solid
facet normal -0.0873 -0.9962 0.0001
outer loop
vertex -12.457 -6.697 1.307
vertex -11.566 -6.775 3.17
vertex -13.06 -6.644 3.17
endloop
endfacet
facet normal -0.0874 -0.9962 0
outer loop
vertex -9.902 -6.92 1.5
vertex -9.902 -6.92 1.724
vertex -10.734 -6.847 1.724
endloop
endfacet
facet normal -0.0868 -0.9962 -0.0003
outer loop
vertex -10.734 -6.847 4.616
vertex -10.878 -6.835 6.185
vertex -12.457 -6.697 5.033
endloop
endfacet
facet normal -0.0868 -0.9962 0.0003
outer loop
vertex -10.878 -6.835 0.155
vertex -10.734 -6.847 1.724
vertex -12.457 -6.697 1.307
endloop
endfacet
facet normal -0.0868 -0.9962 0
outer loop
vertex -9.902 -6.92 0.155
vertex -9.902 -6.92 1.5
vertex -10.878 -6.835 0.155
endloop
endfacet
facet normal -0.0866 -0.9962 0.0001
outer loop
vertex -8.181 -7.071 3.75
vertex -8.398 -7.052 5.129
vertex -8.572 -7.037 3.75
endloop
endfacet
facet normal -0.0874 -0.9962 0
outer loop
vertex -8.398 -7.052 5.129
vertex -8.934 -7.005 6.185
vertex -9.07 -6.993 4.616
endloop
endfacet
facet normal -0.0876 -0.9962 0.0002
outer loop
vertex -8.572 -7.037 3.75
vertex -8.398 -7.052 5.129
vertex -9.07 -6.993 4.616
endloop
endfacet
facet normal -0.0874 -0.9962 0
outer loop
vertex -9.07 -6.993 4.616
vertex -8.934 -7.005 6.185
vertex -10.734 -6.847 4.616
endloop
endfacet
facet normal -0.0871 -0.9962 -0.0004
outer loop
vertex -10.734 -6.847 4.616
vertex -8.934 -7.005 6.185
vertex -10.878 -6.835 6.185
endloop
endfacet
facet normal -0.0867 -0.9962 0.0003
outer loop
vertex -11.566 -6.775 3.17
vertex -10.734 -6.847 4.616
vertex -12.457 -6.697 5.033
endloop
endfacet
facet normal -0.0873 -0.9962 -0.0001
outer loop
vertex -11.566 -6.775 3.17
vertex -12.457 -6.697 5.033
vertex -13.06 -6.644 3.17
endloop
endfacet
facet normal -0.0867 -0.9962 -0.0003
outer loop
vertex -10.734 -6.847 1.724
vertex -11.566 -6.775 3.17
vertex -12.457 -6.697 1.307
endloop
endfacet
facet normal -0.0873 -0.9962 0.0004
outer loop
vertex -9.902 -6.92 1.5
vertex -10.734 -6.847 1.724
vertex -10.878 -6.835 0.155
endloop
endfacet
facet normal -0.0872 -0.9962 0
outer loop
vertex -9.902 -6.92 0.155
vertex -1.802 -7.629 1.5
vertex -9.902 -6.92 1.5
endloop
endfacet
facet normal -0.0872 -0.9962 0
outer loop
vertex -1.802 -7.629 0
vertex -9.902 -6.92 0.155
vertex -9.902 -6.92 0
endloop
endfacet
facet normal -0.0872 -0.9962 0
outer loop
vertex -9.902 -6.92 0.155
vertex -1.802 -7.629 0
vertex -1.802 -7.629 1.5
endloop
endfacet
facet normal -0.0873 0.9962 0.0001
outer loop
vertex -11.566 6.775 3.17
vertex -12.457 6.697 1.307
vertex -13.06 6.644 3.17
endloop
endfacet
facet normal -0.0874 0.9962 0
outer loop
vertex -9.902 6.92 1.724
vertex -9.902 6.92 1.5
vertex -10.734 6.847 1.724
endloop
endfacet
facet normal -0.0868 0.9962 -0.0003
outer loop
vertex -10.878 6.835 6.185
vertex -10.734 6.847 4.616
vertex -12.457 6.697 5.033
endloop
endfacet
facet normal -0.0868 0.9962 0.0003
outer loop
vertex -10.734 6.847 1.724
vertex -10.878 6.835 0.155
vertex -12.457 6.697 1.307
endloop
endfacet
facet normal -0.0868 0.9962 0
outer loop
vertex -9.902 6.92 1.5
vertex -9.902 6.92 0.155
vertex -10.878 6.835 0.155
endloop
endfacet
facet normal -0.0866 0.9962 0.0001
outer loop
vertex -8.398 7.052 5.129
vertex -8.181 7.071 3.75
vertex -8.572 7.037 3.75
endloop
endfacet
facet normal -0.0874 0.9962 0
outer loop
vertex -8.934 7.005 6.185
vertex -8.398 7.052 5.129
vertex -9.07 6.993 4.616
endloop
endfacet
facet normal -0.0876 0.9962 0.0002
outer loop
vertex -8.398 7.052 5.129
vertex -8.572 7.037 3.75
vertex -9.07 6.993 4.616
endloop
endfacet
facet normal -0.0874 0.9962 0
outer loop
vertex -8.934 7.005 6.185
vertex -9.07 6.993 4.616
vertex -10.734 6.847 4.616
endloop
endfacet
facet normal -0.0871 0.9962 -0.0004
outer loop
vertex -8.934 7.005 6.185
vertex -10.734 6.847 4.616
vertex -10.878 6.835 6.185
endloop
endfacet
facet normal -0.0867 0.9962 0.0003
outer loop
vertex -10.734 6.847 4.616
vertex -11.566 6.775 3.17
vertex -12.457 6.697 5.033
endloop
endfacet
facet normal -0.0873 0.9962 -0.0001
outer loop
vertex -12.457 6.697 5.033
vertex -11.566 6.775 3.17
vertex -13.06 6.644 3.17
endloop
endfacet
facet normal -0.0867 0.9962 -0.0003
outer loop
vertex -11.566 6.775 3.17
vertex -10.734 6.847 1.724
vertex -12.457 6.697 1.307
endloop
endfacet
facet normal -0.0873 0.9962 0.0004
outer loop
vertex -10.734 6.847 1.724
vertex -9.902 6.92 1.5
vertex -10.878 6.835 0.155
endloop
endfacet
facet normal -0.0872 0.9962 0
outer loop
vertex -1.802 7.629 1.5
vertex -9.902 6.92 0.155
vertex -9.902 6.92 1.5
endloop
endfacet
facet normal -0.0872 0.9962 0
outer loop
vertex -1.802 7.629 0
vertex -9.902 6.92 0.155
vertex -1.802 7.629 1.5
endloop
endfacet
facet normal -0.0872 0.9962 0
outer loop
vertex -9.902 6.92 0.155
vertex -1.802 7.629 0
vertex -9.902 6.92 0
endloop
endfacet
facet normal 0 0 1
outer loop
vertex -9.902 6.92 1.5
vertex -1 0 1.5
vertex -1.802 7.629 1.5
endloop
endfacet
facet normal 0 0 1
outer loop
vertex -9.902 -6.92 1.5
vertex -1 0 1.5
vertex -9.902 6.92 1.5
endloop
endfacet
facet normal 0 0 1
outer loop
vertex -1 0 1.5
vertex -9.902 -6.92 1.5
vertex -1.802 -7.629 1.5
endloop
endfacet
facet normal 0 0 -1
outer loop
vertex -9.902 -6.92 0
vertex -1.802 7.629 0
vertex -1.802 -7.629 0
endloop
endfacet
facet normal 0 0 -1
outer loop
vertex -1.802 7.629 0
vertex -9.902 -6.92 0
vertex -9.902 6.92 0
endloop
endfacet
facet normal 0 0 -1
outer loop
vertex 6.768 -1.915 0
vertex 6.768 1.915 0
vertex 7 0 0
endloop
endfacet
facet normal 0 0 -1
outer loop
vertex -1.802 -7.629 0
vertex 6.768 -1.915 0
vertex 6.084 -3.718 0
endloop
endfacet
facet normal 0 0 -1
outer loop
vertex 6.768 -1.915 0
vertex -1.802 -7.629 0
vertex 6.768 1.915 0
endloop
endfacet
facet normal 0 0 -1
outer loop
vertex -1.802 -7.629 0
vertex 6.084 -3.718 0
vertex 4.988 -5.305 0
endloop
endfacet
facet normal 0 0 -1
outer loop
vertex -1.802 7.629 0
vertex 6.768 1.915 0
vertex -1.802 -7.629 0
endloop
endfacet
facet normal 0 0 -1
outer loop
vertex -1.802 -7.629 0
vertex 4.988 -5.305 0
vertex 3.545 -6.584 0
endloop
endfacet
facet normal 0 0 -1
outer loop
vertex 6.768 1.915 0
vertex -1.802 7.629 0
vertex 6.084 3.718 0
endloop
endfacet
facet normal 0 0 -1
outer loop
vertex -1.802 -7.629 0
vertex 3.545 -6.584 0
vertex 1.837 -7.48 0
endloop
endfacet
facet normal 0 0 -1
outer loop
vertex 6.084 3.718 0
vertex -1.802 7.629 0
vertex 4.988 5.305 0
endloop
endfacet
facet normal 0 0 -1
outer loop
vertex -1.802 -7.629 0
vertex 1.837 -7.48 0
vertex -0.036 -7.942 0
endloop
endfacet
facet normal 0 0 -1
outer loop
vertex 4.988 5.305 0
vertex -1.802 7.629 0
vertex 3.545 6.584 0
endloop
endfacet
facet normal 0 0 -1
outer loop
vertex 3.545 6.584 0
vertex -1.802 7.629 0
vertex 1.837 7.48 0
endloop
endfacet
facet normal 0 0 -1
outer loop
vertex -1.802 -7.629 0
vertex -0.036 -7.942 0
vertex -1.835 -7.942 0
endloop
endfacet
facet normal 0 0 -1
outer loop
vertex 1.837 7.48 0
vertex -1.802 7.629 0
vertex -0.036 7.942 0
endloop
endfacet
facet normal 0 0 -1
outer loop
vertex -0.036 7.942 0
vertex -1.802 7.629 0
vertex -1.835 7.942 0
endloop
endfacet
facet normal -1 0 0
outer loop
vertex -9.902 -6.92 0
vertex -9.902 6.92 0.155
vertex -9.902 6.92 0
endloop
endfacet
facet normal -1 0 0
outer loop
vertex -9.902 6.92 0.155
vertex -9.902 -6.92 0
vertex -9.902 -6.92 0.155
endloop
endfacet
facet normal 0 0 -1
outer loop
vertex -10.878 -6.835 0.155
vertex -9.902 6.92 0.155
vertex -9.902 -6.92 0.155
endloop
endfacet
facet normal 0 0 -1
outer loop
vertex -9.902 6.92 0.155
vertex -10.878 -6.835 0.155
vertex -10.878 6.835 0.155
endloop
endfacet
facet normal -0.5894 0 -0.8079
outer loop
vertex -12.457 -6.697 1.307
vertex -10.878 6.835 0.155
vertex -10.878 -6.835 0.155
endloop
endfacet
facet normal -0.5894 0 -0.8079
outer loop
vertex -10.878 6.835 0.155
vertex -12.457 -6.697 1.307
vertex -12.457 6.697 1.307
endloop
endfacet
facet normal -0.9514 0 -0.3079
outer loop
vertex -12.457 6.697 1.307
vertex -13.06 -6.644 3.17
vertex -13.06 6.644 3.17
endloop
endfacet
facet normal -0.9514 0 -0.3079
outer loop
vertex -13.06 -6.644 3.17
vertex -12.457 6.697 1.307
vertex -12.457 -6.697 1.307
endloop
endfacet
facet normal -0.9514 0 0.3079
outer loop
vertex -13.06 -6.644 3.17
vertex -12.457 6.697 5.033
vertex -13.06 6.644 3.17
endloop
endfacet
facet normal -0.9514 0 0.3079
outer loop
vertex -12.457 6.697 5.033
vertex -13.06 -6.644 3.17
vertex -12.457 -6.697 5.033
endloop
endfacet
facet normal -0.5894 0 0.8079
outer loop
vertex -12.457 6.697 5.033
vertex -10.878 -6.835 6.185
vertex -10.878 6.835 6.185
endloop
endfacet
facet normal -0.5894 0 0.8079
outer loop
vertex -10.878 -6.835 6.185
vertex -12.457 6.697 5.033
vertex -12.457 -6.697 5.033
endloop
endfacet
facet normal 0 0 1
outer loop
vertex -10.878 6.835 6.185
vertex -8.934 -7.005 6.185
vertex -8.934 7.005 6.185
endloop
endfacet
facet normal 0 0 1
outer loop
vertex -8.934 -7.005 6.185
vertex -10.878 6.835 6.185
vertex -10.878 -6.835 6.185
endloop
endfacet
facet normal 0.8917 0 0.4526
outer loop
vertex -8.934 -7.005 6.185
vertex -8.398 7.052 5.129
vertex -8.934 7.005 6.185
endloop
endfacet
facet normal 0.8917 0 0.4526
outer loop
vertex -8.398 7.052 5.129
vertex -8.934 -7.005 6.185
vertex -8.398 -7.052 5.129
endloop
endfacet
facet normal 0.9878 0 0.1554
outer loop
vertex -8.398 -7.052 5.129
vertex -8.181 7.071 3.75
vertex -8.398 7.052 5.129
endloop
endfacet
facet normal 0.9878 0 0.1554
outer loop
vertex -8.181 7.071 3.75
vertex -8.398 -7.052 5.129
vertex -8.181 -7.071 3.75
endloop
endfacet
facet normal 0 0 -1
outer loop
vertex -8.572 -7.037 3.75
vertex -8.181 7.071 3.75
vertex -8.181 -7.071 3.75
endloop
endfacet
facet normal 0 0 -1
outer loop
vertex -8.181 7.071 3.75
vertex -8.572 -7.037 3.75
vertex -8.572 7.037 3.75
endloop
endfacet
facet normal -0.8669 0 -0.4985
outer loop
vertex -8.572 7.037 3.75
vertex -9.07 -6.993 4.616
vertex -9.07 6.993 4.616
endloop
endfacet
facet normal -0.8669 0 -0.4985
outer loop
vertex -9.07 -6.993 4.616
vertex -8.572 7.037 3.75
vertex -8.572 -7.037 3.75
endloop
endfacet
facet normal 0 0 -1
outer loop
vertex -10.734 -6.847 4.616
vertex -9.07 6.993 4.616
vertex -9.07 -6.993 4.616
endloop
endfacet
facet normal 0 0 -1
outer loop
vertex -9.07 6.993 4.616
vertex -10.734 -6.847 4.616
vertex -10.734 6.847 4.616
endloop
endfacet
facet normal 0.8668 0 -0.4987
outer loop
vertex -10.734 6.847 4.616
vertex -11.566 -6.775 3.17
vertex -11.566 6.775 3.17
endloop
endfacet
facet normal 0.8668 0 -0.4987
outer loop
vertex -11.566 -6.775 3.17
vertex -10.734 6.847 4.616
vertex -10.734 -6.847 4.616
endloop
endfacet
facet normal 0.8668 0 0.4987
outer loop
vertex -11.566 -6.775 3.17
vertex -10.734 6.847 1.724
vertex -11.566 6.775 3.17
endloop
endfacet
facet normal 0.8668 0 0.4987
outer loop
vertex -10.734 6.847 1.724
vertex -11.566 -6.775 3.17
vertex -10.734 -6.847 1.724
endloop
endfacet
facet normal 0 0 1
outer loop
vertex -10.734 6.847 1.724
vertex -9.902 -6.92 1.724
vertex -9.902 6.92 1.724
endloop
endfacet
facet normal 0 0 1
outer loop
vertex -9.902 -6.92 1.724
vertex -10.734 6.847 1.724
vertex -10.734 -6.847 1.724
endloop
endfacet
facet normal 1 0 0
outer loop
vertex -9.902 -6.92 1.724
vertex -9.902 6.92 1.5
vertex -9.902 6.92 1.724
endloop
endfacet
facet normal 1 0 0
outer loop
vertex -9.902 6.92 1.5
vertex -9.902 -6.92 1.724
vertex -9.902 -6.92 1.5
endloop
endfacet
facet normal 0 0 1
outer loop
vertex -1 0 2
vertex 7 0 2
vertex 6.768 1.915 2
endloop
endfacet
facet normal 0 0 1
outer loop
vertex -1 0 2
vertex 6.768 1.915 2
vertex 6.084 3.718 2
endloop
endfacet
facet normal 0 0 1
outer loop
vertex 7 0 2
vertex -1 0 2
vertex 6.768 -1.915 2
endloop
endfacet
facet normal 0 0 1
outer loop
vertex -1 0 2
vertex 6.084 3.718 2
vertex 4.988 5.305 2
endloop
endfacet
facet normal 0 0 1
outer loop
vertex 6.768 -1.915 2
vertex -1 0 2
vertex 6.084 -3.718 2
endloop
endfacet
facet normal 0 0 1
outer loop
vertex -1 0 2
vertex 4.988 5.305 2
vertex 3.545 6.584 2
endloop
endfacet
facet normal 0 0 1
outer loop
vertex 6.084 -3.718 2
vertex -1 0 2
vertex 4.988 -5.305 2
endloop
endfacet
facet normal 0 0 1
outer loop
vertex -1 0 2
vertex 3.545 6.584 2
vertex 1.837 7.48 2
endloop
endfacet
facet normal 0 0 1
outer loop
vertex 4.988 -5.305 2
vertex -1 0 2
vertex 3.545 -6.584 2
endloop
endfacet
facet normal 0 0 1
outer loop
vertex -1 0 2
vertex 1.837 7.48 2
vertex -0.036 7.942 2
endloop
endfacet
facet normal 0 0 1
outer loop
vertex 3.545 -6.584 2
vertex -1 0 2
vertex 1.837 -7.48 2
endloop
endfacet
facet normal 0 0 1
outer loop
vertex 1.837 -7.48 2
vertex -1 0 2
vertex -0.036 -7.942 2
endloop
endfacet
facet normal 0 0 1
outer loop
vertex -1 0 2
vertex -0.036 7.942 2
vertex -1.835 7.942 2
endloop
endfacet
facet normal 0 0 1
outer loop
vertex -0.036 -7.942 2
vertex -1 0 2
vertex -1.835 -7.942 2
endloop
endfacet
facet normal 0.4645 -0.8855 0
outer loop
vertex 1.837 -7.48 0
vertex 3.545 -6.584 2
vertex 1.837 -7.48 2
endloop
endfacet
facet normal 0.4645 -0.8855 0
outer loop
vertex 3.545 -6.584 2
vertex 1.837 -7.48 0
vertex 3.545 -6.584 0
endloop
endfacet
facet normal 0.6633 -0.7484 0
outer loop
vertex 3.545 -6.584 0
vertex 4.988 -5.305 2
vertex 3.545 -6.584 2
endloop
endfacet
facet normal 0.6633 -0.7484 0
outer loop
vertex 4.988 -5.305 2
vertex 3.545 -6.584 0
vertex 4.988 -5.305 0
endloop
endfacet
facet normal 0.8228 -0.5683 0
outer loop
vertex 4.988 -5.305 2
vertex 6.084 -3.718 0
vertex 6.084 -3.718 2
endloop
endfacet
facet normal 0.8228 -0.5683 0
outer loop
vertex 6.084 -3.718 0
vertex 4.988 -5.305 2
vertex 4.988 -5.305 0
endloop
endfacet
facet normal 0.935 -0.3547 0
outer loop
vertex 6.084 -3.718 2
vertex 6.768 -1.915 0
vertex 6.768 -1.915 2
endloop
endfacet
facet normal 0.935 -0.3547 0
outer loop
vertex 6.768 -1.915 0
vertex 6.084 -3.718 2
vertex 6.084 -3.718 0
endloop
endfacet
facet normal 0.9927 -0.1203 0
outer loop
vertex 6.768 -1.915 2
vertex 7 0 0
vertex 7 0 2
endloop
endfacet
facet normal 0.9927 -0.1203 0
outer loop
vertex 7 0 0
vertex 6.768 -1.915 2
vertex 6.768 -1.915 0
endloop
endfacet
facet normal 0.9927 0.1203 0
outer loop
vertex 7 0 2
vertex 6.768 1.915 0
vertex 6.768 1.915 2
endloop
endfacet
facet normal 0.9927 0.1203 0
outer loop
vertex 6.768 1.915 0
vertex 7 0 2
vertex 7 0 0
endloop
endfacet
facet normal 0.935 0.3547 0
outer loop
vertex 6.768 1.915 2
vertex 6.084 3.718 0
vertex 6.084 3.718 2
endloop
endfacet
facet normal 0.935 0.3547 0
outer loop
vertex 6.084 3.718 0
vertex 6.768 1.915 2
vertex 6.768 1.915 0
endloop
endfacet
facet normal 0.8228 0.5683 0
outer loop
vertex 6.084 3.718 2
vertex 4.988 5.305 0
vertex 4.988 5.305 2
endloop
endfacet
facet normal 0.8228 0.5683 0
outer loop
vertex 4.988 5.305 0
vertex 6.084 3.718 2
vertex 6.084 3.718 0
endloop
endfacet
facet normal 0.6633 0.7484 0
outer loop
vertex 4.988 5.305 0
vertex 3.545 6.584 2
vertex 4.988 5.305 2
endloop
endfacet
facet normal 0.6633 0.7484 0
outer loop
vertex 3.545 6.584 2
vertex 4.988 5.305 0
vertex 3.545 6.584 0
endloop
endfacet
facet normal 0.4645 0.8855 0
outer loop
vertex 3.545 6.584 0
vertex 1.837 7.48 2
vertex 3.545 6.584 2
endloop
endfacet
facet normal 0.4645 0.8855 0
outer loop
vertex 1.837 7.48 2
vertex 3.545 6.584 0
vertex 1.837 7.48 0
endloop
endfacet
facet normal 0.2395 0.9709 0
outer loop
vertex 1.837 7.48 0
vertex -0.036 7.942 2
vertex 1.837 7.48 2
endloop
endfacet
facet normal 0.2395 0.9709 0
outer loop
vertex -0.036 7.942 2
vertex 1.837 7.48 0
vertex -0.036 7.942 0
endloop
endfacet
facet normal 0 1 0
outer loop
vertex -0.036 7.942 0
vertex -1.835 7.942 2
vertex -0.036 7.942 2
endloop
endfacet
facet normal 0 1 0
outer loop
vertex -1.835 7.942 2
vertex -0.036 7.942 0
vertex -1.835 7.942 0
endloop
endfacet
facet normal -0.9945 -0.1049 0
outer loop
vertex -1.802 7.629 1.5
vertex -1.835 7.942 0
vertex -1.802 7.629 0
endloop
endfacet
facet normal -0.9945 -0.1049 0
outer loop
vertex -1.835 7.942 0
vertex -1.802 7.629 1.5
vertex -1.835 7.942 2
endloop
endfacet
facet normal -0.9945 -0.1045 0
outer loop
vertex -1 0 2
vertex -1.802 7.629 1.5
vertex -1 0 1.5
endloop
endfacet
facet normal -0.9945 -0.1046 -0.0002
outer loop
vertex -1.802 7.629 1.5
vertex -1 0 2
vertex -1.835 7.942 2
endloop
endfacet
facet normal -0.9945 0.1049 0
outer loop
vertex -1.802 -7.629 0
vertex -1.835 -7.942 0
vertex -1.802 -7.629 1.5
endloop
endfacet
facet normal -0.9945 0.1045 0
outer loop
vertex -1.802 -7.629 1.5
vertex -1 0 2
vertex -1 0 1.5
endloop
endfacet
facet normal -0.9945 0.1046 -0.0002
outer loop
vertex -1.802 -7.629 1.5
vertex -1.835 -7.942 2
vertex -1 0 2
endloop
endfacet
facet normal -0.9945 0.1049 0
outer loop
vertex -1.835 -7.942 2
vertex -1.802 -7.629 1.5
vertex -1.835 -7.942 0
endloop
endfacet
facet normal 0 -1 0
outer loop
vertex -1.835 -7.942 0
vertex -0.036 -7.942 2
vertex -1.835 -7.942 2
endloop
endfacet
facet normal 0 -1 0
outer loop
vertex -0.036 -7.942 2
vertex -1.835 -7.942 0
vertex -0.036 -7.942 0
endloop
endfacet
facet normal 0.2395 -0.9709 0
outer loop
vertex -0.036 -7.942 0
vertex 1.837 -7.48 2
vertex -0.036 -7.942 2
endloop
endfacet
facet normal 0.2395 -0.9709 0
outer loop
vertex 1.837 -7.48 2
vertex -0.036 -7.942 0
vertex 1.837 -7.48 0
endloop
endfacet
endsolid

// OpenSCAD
// file: ../../../common/circle_sector.scad
module circle_sector(r = 0, d = 0, a = [0, 180]) {
    r = max(r, d / 2);
    sector_r = r / cos(180 / $fn);
    step = -360 / $fn;

    points = concat([[0, 0]],
        [for(a = [a[0] : step : a[1] - 360])
            [sector_r * cos(a), sector_r * sin(a)]
        ],
        [[sector_r * cos(a[1]), sector_r * sin(a[1])]]
    );

    difference() {
        circle(r);
        polygon(points);
    }
}

circle_sector();
// main file
use <../../../common/circle_sector.scad>;

function lid_outer_d() = 168.4;
function lid_inner_d() = 161.8;
function lid_edge_curviture_d() = 3.34;
function lid_curviture_clips_wall_thickness() = 1.5;
function lid_curviture_clips_extrude_angle() = 10;
function lid_curviture_clips_overhang() = lid_outer_d() - lid_inner_d() + 3;

function lid_round_edge_wall_thickness() = 2;
function lid_round_d() = 16;

module lid_curviture_clips() {
    offset_x = lid_inner_d() / 2 - lid_curviture_clips_wall_thickness();
    offset_y = lid_edge_curviture_d() / 2 + lid_curviture_clips_wall_thickness();

    outer_r = lid_outer_d() / 2;
    lid_edge_curviture_r = lid_edge_curviture_d() / 2;

    clip_outer_d = lid_edge_curviture_d() + lid_curviture_clips_wall_thickness() * 2;
    clip_inner_d = lid_edge_curviture_d();

    clip_outer_r = clip_outer_d / 2;

    translate([- outer_r - lid_curviture_clips_overhang() / 2, 0, 0])
    rotate([0, 0, - lid_curviture_clips_extrude_angle() / 2])
    rotate_extrude(angle = lid_curviture_clips_extrude_angle())
    union() {
        translate([offset_x, offset_y])
            difference() {
            circle(d = clip_outer_d);
            circle(d = clip_inner_d);
            translate([0, - lid_edge_curviture_r]) square([10, lid_curviture_clips_wall_thickness() * 1.5]);

                difference() {
                    translate([- clip_outer_r, 0]) circle(clip_outer_d);
                    translate([- clip_outer_r - lid_curviture_clips_wall_thickness() * 0.9, 0])circle(clip_outer_d);
                }
            }
        translate([offset_x, 0]) square([lid_curviture_clips_overhang(), lid_curviture_clips_wall_thickness()]);
    }
}

module lid_round_edge() {
    linear_extrude(height = lid_round_edge_wall_thickness())
    difference() {
        circle_sector(d = lid_round_d(), a = [-100, 100]);
        translate([ - lid_outer_d() / 2, 0]) circle(d = lid_outer_d());
    }
}

module lid_handle() {
    union() {
        lid_curviture_clips();
        translate([-1 , 0, 0]) lid_round_edge();
    }
}

lid_handle();
